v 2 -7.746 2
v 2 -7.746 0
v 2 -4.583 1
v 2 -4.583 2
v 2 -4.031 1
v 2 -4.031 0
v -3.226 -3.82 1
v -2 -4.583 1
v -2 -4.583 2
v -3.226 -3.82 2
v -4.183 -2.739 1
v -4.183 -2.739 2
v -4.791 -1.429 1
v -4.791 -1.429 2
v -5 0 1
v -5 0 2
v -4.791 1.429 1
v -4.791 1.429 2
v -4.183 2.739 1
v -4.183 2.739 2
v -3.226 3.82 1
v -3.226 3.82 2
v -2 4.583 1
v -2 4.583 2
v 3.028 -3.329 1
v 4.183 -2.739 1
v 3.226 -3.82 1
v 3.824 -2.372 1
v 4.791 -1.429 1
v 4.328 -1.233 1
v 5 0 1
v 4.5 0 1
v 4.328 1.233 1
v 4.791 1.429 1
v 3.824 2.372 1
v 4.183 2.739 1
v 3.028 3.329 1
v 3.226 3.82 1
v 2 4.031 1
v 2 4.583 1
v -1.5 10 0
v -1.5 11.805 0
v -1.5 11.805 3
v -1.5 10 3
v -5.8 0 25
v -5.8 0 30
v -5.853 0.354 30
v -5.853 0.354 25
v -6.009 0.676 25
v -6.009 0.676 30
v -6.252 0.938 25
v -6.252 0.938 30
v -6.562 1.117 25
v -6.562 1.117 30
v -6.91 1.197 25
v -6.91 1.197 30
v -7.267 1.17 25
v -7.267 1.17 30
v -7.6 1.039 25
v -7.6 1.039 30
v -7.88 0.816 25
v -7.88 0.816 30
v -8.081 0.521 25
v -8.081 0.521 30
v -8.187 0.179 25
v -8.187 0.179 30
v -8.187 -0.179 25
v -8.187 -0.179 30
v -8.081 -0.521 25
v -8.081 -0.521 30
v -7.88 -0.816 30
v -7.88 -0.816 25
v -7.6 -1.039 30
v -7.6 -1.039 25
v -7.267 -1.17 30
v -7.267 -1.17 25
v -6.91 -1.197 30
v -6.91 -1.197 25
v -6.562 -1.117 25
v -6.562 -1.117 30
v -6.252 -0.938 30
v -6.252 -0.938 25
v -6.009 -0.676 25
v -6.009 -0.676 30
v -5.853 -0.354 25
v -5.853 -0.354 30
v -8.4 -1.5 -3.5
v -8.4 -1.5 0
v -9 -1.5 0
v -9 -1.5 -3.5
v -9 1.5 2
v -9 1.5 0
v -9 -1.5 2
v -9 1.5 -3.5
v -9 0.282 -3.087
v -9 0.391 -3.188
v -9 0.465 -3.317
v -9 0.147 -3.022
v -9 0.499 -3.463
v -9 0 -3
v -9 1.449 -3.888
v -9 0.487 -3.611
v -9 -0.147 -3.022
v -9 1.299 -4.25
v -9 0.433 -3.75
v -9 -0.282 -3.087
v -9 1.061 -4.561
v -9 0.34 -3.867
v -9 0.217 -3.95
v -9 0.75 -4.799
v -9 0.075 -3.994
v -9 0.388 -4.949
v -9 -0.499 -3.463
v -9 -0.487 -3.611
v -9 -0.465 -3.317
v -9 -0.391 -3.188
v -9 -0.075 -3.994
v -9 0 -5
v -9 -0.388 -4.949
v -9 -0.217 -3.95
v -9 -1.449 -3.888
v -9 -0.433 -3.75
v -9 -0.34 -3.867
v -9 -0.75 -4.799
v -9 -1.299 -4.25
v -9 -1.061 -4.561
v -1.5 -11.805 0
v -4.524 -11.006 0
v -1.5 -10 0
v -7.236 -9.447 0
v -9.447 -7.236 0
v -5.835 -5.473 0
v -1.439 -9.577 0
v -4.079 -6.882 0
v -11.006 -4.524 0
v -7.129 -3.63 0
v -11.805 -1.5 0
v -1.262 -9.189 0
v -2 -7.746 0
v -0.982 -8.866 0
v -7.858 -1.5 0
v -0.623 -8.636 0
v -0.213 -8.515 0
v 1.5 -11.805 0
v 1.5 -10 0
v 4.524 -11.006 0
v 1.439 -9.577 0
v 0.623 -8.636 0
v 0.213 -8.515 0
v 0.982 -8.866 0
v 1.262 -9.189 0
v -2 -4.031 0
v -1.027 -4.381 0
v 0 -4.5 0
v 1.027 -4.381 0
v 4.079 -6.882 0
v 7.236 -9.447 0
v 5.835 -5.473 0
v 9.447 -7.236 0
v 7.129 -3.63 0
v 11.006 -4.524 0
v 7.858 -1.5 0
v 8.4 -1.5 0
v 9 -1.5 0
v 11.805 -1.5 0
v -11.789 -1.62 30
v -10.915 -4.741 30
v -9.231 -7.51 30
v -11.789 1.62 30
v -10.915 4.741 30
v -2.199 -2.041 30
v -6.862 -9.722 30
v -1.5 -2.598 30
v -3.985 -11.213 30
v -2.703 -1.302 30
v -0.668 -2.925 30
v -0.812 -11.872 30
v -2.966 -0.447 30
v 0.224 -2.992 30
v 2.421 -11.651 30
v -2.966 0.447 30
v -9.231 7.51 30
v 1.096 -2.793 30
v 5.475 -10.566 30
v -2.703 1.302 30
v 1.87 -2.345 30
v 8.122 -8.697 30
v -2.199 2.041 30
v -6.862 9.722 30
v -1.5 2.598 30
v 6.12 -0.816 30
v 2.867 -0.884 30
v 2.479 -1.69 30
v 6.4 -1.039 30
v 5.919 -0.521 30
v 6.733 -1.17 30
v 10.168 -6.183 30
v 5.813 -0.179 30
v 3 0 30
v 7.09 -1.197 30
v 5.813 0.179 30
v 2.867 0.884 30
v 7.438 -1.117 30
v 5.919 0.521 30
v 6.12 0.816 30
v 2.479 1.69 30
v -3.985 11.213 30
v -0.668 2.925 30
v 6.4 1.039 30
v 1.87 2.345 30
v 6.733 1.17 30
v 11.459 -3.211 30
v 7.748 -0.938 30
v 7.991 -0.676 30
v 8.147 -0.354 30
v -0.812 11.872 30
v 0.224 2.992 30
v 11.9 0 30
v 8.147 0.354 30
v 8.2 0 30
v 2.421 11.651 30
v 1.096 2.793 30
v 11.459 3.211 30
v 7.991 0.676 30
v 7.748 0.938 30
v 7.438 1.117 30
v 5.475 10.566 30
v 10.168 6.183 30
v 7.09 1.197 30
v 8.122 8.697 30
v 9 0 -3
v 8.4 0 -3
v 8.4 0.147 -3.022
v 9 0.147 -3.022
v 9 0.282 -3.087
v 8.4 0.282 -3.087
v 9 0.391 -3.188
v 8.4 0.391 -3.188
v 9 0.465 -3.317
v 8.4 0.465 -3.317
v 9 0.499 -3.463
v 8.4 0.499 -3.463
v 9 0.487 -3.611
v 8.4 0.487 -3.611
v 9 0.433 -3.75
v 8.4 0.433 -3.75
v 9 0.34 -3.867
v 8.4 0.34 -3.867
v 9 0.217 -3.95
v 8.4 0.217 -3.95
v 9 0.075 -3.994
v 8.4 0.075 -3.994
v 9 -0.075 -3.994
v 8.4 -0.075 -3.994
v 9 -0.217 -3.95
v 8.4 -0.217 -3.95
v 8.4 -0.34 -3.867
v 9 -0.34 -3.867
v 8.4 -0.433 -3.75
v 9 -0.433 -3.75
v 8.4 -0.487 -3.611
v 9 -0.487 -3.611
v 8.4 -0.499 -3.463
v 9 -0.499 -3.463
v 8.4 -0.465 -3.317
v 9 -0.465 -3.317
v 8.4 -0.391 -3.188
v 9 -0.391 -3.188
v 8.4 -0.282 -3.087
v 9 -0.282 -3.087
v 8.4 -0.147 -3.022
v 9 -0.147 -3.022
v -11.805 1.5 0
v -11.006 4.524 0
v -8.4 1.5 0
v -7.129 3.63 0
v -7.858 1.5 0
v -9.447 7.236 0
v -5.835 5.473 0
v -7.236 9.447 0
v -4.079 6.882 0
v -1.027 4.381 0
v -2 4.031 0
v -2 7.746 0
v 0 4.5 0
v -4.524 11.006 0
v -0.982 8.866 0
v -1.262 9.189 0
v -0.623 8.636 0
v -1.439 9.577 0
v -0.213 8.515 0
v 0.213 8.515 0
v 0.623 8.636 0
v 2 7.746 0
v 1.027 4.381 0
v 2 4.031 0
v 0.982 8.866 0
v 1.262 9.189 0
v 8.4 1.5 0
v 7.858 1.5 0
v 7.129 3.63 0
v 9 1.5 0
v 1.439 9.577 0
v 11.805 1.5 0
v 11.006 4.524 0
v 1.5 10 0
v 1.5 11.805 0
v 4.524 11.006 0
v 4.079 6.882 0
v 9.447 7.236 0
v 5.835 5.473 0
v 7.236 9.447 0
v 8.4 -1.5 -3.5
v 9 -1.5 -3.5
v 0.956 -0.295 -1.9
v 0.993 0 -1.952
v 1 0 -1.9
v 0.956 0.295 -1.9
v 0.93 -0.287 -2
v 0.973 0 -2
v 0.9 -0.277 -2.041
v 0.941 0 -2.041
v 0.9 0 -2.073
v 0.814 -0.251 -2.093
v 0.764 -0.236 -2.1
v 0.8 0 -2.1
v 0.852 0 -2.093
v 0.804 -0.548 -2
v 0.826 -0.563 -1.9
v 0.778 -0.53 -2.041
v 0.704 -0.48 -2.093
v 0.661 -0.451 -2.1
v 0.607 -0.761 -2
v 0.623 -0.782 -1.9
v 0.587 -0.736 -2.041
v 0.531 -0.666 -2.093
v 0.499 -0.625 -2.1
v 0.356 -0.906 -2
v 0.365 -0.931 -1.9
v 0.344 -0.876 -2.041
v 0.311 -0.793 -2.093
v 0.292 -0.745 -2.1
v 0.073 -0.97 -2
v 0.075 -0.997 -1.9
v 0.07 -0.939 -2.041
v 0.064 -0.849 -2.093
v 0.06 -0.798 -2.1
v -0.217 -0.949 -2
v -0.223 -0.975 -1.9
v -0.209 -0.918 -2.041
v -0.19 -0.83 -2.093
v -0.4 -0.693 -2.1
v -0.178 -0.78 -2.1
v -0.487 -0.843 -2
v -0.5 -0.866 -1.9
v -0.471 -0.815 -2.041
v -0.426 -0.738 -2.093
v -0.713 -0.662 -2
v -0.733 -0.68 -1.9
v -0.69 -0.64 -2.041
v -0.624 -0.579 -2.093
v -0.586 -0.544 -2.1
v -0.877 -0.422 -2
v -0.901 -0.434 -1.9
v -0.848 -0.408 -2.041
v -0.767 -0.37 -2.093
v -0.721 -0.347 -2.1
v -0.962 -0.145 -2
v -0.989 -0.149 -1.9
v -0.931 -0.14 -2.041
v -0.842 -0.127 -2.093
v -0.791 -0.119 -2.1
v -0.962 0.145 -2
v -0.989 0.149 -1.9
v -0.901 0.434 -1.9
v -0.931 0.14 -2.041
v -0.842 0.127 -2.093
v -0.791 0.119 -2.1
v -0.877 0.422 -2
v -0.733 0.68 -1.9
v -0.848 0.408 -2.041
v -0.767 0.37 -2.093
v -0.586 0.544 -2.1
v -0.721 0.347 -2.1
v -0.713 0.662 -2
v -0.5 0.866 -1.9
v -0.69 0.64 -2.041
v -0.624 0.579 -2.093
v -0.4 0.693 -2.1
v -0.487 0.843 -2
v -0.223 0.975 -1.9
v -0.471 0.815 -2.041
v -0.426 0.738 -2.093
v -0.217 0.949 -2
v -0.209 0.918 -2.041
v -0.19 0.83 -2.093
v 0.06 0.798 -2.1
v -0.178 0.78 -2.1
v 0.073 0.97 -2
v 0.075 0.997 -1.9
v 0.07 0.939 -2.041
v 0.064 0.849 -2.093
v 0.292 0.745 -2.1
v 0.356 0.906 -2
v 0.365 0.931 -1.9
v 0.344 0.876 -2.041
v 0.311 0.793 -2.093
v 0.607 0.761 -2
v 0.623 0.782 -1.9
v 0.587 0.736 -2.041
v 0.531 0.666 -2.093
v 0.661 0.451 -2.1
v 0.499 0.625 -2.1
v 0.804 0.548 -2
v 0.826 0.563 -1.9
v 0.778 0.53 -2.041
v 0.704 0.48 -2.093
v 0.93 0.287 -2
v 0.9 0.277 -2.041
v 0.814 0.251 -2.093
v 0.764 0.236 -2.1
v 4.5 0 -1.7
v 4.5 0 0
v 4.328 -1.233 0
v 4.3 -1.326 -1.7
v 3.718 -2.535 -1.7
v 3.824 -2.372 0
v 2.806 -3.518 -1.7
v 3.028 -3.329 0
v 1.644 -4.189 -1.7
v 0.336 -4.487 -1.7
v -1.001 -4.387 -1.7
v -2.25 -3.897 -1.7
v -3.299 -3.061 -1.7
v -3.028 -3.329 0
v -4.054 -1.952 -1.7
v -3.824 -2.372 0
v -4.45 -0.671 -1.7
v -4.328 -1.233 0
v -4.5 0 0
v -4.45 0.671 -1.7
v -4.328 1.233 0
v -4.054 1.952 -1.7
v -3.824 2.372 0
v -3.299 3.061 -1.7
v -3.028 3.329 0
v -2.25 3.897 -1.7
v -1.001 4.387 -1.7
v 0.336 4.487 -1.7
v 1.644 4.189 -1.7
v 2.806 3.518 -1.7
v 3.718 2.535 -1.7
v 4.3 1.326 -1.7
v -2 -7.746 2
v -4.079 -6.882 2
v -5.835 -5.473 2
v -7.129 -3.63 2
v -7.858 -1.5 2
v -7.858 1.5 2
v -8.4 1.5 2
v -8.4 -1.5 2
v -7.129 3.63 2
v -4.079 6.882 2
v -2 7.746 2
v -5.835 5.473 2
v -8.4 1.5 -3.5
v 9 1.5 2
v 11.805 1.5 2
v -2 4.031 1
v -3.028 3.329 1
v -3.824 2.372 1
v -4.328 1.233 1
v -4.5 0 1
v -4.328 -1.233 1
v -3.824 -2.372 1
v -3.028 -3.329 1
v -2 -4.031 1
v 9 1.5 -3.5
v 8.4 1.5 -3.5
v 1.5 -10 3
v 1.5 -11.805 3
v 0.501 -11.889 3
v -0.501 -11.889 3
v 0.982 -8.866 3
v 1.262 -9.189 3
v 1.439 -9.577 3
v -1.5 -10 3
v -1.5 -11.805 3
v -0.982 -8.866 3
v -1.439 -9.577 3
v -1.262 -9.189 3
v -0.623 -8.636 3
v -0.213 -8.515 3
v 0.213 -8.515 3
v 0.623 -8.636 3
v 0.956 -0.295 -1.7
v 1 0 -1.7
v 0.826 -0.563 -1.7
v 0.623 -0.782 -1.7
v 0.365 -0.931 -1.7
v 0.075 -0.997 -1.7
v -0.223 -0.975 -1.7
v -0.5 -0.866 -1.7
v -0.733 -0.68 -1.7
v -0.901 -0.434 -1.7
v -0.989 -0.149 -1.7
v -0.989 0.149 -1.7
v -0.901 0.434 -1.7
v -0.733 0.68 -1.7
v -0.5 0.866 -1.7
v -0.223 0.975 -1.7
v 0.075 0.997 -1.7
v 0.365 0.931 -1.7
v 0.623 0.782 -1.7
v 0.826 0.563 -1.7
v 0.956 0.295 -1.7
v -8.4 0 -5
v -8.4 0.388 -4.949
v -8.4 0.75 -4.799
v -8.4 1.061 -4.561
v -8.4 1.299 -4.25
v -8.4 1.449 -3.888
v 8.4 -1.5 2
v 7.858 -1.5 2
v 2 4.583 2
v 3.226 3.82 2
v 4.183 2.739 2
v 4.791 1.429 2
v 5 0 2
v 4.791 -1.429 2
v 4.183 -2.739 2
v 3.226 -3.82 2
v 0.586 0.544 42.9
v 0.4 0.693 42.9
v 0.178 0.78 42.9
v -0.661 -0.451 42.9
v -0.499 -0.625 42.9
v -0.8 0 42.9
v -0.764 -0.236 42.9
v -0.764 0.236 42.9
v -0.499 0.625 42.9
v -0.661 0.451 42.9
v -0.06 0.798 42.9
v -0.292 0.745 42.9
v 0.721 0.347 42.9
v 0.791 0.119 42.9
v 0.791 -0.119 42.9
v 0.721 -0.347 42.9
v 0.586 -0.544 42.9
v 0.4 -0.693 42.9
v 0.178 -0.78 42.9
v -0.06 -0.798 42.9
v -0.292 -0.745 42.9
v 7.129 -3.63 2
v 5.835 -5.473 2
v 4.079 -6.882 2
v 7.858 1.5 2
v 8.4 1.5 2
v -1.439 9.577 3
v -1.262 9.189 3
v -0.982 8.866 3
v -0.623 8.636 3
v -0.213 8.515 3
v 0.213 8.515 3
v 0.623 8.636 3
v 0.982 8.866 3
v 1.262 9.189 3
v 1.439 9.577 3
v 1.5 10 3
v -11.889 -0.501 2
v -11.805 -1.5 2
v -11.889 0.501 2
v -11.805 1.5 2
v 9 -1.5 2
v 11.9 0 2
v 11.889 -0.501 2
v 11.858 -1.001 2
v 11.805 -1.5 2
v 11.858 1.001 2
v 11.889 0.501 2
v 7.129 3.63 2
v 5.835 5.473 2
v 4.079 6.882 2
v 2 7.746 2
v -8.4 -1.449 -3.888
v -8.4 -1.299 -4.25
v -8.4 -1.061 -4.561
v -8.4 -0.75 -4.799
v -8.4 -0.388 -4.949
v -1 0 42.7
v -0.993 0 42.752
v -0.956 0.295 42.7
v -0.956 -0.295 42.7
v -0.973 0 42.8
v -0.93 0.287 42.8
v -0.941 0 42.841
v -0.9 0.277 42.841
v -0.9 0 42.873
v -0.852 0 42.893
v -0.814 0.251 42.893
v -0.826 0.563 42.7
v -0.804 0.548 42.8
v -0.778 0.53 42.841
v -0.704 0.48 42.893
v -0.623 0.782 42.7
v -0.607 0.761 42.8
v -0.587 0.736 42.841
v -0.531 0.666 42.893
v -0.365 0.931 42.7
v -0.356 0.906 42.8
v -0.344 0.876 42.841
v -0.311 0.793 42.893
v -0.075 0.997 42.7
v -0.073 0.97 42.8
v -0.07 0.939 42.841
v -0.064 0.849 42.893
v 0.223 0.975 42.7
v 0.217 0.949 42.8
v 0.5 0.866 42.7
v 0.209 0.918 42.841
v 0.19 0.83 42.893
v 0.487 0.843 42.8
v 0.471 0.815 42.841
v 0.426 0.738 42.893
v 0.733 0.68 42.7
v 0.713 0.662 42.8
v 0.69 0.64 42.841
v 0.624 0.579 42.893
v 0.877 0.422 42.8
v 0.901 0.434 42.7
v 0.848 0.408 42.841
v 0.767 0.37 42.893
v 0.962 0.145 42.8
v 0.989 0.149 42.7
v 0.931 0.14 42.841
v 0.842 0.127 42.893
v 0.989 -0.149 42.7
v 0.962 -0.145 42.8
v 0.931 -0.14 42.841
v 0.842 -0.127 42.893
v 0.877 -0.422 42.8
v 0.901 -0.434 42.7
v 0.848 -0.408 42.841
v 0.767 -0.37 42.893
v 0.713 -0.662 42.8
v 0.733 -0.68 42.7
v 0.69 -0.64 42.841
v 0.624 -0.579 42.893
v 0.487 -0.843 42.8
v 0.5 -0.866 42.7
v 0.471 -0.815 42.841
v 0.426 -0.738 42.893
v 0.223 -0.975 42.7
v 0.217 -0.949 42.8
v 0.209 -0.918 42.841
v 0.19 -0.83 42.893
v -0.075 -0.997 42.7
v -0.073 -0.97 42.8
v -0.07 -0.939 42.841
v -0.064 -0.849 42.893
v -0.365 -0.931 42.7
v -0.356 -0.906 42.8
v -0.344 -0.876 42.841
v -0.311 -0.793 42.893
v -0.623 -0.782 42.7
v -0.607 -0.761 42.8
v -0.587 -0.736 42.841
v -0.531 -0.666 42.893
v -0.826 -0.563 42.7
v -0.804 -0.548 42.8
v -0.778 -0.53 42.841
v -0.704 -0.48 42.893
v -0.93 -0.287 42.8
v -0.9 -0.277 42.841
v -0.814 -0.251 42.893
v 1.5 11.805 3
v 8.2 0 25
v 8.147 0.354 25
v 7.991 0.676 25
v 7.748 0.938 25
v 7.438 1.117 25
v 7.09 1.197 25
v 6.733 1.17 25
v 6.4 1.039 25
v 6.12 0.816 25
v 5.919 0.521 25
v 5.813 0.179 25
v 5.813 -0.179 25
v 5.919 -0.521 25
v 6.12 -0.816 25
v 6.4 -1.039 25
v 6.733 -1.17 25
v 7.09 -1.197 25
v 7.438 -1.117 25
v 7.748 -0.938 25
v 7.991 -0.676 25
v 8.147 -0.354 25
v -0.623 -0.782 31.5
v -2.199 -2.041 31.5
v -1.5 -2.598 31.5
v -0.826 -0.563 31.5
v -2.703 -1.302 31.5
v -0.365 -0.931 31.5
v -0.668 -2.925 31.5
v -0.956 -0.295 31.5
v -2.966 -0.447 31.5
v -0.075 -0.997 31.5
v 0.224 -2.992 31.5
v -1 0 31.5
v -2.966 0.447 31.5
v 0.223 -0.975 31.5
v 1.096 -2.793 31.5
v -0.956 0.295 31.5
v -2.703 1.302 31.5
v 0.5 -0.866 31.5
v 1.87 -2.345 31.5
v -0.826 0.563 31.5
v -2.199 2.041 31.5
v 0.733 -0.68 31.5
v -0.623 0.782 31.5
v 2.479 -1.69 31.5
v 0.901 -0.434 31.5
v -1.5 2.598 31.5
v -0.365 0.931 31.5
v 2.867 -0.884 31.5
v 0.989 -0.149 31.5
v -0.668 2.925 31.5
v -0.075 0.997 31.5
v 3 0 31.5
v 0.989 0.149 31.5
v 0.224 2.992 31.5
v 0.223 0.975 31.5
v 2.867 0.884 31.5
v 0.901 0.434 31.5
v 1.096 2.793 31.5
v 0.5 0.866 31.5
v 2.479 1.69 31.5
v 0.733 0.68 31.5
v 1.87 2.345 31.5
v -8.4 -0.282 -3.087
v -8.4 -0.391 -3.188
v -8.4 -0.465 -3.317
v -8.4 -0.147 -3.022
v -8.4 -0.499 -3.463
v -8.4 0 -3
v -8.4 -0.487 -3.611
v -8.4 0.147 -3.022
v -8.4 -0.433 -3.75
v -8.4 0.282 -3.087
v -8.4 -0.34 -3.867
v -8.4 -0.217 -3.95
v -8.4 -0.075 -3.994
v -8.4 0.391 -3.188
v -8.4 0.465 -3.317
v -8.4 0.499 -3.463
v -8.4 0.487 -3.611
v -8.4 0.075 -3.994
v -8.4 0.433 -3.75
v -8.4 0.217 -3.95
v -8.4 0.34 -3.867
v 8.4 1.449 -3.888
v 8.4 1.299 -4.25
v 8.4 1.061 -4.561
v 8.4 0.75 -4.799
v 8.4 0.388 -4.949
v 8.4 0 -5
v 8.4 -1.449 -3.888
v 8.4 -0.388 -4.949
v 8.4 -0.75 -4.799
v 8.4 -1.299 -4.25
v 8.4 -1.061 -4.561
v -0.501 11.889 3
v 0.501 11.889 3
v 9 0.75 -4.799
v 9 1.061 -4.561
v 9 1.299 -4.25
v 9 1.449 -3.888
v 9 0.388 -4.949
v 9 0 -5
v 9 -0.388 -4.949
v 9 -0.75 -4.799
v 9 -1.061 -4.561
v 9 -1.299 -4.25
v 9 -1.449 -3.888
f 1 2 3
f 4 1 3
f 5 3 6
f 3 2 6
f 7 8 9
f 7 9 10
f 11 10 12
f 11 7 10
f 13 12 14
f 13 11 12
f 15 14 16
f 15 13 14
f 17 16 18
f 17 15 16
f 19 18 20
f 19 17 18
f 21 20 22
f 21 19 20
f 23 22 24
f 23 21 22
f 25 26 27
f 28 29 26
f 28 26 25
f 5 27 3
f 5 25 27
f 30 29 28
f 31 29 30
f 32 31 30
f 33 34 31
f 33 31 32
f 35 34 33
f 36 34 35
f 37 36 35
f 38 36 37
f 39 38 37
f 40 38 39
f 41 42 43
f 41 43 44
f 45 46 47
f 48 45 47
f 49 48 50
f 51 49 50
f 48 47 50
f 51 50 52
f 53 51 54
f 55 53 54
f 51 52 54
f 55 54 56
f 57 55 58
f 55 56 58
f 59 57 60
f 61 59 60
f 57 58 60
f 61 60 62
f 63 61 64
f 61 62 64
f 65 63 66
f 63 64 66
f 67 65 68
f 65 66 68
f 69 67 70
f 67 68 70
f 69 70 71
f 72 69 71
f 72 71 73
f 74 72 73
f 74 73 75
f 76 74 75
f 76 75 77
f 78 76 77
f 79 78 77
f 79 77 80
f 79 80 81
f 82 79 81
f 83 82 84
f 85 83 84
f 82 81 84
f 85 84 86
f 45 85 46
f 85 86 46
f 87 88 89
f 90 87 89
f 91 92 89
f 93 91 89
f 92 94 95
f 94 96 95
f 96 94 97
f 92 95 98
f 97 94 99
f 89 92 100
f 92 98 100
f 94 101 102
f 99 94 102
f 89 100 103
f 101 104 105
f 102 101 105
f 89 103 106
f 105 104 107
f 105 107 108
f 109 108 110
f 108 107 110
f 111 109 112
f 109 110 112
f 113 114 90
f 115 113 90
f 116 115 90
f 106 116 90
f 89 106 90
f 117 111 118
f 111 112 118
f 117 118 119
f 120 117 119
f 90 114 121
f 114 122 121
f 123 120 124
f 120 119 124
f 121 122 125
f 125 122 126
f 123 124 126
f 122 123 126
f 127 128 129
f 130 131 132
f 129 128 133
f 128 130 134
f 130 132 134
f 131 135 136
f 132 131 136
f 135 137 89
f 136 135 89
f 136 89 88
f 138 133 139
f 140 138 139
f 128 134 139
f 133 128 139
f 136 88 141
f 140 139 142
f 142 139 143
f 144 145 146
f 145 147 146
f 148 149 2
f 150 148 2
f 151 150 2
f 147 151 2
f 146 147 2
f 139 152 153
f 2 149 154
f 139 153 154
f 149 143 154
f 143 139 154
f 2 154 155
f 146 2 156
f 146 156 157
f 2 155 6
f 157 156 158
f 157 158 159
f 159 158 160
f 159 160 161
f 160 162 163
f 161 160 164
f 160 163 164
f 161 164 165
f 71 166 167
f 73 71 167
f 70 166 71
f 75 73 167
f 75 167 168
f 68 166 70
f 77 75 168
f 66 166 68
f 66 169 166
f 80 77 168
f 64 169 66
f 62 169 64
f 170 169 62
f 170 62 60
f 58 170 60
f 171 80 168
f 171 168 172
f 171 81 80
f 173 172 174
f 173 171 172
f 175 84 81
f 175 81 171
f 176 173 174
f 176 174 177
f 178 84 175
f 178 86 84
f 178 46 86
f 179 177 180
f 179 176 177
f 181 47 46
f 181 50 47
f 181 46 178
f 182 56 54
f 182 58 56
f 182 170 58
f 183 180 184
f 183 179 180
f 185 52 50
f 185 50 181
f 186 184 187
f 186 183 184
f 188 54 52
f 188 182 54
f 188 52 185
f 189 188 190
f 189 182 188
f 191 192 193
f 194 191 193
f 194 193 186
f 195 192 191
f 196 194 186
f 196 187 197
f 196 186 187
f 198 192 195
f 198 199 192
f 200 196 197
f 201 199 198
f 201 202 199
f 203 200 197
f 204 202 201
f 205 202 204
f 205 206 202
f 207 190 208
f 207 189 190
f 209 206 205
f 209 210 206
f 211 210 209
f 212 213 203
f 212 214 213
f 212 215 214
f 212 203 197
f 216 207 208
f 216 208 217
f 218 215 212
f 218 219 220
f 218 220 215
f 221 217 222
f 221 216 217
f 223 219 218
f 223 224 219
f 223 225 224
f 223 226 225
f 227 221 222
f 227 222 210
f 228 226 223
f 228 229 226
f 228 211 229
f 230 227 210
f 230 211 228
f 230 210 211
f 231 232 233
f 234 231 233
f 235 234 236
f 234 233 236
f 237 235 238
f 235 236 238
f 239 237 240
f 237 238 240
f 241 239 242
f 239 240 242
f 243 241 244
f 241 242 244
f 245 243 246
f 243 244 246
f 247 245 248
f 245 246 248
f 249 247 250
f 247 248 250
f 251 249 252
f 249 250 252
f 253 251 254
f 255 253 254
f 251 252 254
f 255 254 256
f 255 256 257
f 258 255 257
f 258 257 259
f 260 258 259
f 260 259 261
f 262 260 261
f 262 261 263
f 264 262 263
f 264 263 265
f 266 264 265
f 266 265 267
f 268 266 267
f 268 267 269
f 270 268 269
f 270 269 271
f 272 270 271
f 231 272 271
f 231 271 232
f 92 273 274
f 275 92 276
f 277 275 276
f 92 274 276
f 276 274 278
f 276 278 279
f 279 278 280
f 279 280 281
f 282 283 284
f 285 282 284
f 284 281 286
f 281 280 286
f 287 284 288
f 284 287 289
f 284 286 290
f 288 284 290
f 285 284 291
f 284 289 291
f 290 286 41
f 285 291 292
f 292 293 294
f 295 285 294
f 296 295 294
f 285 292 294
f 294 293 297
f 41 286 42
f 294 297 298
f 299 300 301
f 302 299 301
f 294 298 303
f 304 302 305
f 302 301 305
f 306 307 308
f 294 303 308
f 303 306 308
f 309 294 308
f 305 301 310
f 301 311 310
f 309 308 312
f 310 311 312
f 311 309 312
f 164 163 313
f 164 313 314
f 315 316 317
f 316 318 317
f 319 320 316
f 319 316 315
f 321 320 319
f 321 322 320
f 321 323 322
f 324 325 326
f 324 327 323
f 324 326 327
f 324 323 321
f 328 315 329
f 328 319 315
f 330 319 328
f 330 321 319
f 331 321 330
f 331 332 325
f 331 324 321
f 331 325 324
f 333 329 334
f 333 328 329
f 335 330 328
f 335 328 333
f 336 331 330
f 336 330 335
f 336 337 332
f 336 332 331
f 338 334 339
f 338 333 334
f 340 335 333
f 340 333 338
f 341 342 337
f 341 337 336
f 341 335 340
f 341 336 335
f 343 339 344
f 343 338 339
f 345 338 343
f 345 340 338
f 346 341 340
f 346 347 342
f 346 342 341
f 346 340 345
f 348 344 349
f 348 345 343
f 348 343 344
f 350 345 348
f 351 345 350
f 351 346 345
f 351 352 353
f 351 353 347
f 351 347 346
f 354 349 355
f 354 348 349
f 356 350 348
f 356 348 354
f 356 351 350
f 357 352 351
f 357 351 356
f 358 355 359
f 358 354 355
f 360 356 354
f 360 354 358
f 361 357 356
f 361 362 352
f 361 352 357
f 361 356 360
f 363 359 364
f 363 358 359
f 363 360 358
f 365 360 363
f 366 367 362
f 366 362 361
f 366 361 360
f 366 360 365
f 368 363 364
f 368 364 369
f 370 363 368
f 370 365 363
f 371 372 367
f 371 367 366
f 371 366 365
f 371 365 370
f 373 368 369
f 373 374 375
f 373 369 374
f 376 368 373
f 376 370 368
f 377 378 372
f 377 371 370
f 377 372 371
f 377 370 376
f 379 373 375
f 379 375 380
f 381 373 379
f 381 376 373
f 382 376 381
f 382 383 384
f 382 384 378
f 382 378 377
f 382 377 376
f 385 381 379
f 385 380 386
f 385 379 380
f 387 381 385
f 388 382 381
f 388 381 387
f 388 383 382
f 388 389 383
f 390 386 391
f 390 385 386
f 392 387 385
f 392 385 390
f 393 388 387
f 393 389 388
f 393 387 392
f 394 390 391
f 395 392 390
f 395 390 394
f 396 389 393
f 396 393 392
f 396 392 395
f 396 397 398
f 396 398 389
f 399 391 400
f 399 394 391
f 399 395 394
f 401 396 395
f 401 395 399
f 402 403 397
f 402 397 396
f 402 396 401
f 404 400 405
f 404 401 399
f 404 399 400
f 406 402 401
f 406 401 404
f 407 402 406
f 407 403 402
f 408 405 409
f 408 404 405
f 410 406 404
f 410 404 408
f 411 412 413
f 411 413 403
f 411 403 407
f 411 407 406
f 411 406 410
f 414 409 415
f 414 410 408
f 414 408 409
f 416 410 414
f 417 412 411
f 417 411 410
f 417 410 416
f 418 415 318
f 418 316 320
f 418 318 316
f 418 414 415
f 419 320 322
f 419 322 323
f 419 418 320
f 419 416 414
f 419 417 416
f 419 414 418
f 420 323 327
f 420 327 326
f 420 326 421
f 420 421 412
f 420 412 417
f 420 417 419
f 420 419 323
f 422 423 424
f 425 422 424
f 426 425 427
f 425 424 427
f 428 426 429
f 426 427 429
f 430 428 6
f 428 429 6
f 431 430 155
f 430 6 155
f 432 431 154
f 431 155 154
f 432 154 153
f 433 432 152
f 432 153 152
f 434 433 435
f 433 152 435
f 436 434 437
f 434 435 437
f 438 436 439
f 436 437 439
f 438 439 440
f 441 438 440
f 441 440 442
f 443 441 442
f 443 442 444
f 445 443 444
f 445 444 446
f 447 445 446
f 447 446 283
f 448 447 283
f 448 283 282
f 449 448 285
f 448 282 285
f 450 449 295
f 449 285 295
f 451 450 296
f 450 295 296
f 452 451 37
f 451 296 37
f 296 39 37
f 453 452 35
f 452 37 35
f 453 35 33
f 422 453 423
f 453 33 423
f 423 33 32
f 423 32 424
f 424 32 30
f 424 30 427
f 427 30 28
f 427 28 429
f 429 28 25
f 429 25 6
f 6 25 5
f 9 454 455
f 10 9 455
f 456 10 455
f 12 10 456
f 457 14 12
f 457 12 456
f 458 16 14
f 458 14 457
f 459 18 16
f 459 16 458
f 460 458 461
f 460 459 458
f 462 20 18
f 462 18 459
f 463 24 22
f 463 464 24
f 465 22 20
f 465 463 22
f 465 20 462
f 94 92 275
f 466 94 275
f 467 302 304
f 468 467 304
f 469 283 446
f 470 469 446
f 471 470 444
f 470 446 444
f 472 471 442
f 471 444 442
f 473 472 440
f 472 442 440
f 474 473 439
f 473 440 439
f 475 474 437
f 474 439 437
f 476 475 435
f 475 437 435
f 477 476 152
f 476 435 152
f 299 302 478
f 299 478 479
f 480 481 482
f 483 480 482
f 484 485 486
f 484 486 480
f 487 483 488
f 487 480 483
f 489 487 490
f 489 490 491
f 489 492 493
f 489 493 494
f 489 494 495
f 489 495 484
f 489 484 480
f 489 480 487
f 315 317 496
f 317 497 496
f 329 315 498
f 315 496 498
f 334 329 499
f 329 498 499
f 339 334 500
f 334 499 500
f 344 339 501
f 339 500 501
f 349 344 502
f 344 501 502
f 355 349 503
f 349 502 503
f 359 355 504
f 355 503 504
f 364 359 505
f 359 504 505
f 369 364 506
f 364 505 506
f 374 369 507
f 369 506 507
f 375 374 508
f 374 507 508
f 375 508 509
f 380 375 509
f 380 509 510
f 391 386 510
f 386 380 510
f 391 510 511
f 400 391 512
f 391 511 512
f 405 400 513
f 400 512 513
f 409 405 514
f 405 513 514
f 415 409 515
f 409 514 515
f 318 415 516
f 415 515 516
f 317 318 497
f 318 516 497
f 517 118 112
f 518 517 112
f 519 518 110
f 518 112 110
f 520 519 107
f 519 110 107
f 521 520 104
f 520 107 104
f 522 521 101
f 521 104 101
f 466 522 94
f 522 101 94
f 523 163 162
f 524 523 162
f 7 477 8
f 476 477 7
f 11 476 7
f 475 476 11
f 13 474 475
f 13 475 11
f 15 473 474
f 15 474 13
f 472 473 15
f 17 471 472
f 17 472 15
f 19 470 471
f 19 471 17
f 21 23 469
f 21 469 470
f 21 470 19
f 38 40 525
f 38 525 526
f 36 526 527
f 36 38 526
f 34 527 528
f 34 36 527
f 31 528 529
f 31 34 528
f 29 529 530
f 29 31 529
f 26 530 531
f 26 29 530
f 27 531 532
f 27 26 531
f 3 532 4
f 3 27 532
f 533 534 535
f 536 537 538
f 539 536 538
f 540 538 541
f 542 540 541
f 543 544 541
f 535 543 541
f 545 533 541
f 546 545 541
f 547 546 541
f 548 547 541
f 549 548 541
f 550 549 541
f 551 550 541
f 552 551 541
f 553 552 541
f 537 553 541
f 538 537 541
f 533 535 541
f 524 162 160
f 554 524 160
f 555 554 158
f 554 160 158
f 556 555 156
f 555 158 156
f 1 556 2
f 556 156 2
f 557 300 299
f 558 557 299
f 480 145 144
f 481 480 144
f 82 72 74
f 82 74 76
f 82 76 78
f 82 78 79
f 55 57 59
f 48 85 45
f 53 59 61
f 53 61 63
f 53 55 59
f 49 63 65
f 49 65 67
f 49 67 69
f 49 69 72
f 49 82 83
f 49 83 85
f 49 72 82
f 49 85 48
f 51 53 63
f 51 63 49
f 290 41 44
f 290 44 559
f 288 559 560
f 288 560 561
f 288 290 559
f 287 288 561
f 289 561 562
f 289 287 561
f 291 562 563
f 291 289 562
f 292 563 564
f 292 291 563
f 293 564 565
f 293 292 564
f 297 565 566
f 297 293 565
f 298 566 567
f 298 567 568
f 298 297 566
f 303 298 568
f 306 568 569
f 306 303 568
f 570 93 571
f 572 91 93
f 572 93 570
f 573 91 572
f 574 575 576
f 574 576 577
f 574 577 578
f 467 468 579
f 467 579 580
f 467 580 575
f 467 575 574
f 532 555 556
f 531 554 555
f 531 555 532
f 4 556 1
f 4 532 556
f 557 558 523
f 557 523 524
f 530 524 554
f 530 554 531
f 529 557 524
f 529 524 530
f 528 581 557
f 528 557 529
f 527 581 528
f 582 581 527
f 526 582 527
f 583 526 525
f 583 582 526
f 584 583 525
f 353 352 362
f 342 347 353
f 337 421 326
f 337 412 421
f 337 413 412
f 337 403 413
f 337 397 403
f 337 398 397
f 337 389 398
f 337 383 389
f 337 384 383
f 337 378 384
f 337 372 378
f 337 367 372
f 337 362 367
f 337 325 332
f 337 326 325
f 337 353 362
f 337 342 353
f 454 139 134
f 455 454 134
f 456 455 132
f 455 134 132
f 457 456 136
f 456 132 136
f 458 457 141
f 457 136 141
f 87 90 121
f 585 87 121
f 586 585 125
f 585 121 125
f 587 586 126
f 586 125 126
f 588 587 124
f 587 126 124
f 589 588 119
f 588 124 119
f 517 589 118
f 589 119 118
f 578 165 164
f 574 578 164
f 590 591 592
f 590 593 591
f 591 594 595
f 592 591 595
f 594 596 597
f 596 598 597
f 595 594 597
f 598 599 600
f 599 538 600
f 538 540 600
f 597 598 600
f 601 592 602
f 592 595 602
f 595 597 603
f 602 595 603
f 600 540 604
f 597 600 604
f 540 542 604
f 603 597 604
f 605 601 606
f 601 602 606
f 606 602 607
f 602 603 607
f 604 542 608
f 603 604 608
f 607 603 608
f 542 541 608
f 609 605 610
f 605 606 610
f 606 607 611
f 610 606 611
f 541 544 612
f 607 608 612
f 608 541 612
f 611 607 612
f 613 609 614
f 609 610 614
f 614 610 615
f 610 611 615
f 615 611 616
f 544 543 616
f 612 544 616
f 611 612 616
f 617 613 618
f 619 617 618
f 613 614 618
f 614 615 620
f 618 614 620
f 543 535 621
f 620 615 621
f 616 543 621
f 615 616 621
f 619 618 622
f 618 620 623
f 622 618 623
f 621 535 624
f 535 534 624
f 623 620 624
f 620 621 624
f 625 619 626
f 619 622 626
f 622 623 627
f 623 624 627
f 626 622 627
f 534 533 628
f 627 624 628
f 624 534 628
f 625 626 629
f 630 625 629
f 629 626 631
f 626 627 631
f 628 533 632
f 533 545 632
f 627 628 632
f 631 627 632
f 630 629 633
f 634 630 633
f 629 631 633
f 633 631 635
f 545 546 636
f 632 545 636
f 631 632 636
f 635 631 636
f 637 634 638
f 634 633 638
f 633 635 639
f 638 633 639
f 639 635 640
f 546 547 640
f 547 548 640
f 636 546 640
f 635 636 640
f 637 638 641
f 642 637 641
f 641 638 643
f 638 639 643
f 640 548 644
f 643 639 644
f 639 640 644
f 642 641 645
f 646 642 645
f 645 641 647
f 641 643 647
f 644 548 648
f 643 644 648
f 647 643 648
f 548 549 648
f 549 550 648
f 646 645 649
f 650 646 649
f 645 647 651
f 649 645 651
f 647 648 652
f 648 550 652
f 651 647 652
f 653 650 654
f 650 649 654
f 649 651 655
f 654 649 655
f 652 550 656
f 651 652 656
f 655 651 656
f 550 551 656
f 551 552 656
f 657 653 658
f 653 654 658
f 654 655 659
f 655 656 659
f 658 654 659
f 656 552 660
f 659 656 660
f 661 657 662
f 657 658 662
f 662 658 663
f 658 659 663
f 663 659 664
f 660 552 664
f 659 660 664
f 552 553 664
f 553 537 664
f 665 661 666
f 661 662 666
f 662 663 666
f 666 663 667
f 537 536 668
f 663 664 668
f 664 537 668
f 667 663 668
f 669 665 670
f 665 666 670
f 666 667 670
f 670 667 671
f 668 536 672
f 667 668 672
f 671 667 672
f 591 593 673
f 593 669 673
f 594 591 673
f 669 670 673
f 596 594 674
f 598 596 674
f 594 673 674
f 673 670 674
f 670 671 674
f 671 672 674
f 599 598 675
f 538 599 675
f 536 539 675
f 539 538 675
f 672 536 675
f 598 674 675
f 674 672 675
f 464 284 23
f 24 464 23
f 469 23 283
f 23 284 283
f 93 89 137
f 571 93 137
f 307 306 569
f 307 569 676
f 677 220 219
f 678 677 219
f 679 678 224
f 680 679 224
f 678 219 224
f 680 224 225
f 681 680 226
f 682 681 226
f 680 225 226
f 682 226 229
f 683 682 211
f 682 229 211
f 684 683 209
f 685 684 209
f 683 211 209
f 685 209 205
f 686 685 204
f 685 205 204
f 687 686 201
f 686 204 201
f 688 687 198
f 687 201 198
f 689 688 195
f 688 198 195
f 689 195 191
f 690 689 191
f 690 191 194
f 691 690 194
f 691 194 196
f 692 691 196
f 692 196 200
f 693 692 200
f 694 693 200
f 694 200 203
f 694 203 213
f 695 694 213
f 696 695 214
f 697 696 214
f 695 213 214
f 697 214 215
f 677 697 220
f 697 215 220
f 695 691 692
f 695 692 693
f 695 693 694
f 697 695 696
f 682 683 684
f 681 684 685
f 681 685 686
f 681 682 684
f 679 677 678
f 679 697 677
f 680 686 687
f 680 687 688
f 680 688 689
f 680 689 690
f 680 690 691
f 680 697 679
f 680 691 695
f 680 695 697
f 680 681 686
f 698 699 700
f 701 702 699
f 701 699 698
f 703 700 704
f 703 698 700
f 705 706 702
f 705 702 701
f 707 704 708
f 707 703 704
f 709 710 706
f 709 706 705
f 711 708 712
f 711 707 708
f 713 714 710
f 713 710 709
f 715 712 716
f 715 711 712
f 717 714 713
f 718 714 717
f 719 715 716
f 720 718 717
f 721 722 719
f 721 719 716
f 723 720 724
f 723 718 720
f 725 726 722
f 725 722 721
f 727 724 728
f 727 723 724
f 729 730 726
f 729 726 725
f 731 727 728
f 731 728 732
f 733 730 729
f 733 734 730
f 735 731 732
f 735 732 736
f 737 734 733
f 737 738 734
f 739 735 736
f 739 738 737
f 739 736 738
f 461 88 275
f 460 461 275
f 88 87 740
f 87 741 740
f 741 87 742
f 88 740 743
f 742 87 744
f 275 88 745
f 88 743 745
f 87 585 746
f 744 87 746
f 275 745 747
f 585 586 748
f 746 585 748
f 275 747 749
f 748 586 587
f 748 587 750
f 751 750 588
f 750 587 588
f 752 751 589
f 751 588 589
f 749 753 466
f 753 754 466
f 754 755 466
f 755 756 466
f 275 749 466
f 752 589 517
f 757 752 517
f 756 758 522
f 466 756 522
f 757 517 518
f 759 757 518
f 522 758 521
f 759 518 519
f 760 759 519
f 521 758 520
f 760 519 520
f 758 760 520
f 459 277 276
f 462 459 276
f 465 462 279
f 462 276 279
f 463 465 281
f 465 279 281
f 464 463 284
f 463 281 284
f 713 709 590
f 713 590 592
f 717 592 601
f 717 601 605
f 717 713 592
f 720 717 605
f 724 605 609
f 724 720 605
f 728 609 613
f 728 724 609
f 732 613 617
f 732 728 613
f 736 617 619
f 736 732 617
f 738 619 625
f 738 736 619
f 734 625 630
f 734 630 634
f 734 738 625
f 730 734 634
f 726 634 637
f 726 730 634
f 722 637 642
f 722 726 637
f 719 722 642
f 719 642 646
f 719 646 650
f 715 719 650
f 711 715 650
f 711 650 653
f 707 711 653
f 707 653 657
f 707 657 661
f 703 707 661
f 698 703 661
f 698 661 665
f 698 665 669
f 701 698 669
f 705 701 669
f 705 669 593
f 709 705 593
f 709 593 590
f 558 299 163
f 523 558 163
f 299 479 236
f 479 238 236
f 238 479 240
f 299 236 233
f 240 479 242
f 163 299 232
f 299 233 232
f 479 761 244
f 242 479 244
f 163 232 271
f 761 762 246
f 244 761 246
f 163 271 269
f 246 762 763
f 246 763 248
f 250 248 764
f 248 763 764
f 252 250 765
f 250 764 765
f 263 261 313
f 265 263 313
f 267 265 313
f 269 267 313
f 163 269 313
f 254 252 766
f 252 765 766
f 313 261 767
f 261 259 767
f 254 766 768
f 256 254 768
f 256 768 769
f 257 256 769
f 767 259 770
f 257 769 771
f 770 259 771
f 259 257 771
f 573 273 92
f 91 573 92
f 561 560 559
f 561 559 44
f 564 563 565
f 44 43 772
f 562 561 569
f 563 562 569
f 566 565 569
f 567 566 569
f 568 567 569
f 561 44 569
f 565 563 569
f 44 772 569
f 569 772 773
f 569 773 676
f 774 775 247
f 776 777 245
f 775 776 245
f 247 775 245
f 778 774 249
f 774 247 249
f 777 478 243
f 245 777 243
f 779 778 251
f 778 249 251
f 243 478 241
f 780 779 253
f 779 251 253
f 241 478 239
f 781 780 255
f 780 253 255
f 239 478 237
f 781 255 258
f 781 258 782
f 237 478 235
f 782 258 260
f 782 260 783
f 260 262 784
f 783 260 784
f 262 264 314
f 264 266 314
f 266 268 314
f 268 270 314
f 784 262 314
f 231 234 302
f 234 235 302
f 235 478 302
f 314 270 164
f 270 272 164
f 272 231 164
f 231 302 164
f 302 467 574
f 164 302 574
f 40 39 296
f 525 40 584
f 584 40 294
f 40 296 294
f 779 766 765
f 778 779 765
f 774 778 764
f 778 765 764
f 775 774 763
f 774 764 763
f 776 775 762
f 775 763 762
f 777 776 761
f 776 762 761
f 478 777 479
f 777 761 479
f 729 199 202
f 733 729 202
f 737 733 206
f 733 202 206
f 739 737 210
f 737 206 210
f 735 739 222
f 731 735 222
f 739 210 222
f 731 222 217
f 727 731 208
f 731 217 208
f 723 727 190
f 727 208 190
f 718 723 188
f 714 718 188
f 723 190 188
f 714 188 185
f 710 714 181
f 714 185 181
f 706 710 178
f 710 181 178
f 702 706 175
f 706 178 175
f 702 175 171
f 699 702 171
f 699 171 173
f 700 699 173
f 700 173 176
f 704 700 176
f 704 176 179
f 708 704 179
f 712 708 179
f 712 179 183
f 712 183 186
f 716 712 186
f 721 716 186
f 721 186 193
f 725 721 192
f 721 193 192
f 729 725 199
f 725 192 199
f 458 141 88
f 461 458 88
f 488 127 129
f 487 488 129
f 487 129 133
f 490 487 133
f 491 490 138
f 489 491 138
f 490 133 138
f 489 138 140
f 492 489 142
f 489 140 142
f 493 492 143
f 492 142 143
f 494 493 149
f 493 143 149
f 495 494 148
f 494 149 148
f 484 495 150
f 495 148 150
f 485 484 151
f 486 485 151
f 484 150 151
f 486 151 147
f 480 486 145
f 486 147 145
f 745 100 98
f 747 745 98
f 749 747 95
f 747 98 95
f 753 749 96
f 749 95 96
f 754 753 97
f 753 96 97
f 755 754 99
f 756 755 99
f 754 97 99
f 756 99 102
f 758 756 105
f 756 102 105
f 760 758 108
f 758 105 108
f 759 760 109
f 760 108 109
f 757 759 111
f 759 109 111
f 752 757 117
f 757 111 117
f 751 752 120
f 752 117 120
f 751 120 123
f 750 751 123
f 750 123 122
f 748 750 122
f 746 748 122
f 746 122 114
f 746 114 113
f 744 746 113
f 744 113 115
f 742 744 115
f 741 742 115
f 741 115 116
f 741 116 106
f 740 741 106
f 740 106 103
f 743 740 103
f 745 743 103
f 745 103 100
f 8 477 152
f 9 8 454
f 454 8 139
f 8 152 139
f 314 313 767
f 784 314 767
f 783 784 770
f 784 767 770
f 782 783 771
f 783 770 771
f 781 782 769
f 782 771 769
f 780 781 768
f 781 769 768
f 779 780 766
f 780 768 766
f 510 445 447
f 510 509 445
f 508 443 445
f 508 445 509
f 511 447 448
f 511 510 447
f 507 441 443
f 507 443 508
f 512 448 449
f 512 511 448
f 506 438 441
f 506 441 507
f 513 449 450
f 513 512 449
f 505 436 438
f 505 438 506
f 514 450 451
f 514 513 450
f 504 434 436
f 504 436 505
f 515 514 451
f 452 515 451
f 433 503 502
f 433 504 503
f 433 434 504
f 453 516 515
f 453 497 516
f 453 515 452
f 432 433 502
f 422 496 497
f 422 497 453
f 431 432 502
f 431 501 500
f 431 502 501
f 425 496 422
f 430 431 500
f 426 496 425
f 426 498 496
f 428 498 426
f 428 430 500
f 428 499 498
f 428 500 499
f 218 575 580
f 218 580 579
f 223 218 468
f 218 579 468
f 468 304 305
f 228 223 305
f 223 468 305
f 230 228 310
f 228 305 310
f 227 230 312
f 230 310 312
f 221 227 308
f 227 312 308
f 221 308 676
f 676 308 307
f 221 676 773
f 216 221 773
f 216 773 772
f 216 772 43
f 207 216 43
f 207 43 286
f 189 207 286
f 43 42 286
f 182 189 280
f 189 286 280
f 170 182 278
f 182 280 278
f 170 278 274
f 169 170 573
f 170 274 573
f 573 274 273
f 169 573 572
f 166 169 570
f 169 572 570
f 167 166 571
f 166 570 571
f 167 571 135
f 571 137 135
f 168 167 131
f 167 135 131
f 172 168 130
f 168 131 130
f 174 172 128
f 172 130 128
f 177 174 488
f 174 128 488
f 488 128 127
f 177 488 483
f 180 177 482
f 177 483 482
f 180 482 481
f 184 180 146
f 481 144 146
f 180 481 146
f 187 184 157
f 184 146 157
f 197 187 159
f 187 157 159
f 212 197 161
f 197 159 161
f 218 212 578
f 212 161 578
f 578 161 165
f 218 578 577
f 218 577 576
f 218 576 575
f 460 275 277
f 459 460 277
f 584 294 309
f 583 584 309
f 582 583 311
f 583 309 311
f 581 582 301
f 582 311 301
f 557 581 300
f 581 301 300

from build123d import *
from build123d.topology import SkipClean

# Parameters (mm, degrees)
CROQUIS2_R              = 11.9
SALIENTE_EXTRUIR1_DEPTH = 30
CROQUIS3_R              = 3
SALIENTE_EXTRUIR2_DEPTH = 1.5
CROQUIS4_R              = 1
CORTAR_EXTRUIR1_DEPTH   = 36.713722853
CROQUIS5_R              = 1.2
CORTAR_EXTRUIR2_DEPTH   = 5
CROQUIS7_R              = 4.5
SALIENTE_EXTRUIR3_DEPTH = 1.7
CORTAR_EXTRUIR3_REACH   = 39.222
CROQUIS8_R              = 1
SALIENTE_EXTRUIR4_DEPTH = 5
CORTAR_EXTRUIR4_REACH   = 41.632
CROQUIS10_R             = 0.5
CORTAR_EXTRUIR5_DEPTH   = 3
CORTAR_EXTRUIR7_DEPTH   = 2
SALIENTE_EXTRUIR5_START = 1
SALIENTE_EXTRUIR5_DEPTH = 1
CROQUIS16_R             = 1
SALIENTE_EXTRUIR8_DEPTH = 0.4
CROQUIS17_R             = 1
SALIENTE_EXTRUIR9_DEPTH = 45
REDONDEO4_R             = 0.2


with BuildPart() as part:
    # Croquis2 → Saliente-Extruir1 (new body)
    with BuildSketch(Plane.XY):
        Circle(CROQUIS2_R)
    extrude(amount=SALIENTE_EXTRUIR1_DEPTH)

    # Croquis3 → Saliente-Extruir2 (add)
    with BuildSketch(Plane.XY.offset(30)):
        Circle(CROQUIS3_R)
    extrude(amount=SALIENTE_EXTRUIR2_DEPTH)

    # Croquis4 → Cortar-Extruir1 (cut, through all)
    with BuildSketch(Plane.XY.offset(31.5)):
        Circle(CROQUIS4_R)
    extrude(amount=-CORTAR_EXTRUIR1_DEPTH, mode=Mode.SUBTRACT)

    # Croquis5 → Cortar-Extruir2 (cut)
    with BuildSketch(Plane.XY.offset(30)):
        with Locations((7, 0)):
            Circle(CROQUIS5_R)
        with Locations((-7, 0)):
            Circle(CROQUIS5_R)
    extrude(amount=-CORTAR_EXTRUIR2_DEPTH, mode=Mode.SUBTRACT)

    # Croquis7 → Saliente-Extruir3 (add)
    with BuildSketch(Plane(origin=(0, 0, 0), x_dir=(-1, 0, 0), z_dir=(0, 0, -1))):
        with Locations(Location((0, 0, 0), (0, 0, 180))):
            Circle(CROQUIS7_R)
    extrude(amount=SALIENTE_EXTRUIR3_DEPTH)

    # Croquis8 → Cortar-Extruir3 (cut, up to next)
    with BuildSketch(Plane(origin=(0, 0, -1.7), x_dir=(-1, 0, 0), z_dir=(0, 0, -1)), mode=Mode.PRIVATE) as cortar_extruir3_sk1:
        with Locations(Location((0, 0, 0), (0, 0, 180))):
            Circle(CROQUIS8_R)
    cortar_extruir3_tool1 = extrude(cortar_extruir3_sk1.sketch, amount=-CORTAR_EXTRUIR3_REACH, mode=Mode.PRIVATE) & part.part
    add(cortar_extruir3_tool1.solids().sort_by_distance((0, 0, -1.7))[0], mode=Mode.SUBTRACT)

    # Croquis9 → Saliente-Extruir4 (add)
    with BuildSketch(Plane(origin=(0, 0, 0), x_dir=(-1, 0, 0), z_dir=(0, 0, -1))):
        Polygon((-9, 0), (-9, 1.5), (-8.4, 1.5), (-8.4, -1.5), (-9, -1.5), align=None)
        Polygon((9, 0), (9, 1.5), (8.4, 1.5), (8.4, -1.5), (9, -1.5), align=None)
    extrude(amount=SALIENTE_EXTRUIR4_DEPTH)

    # Cortar-Extruir4: up to this face of the body (flat: up to its plane)
    cortar_extruir4_end = Plane(part.part.faces().sort_by_distance((9, 0, -2.5))[0])
    # Croquis10 → Cortar-Extruir4 (cut, up to the picked face)
    with BuildSketch(Plane.ZY.offset(9), mode=Mode.PRIVATE) as cortar_extruir4_sk1:
        with BuildLine():
            Line((-5, -1.5), (-3.5, -1.5))
            ThreePointArc((-3.5, -1.5), (-4.560660172, -1.060660172), (-5, 0))
            Line((-5, 0), (-5, -1.5))
        make_face()
    cortar_extruir4_tool1 = split(extrude(cortar_extruir4_sk1.sketch, amount=-CORTAR_EXTRUIR4_REACH, mode=Mode.PRIVATE), bisect_by=cortar_extruir4_end, keep=Keep.BOTH, mode=Mode.PRIVATE)
    # Croquis10 → Cortar-Extruir4 (cut, up to the picked face)
    with BuildSketch(Plane.ZY.offset(9), mode=Mode.PRIVATE) as cortar_extruir4_sk2:
        with BuildLine():
            Line((-5, 1.5), (-5, 0))
            ThreePointArc((-5, 0), (-4.560660172, 1.060660172), (-3.5, 1.5))
            Line((-3.5, 1.5), (-5, 1.5))
        make_face()
    cortar_extruir4_tool2 = split(extrude(cortar_extruir4_sk2.sketch, amount=-CORTAR_EXTRUIR4_REACH, mode=Mode.PRIVATE), bisect_by=cortar_extruir4_end, keep=Keep.BOTH, mode=Mode.PRIVATE)
    # Croquis10 → Cortar-Extruir4 (cut, up to the picked face)
    with BuildSketch(Plane.ZY.offset(9), mode=Mode.PRIVATE) as cortar_extruir4_sk3:
        with Locations((-3.5, 0)):
            Circle(CROQUIS10_R)
    cortar_extruir4_tool3 = split(extrude(cortar_extruir4_sk3.sketch, amount=-CORTAR_EXTRUIR4_REACH, mode=Mode.PRIVATE), bisect_by=cortar_extruir4_end, keep=Keep.BOTH, mode=Mode.PRIVATE)
    add(cortar_extruir4_tool1.solids().sort_by(Axis((-9, -1.164948, -4.664948), (1, 0, 0)))[0], mode=Mode.SUBTRACT)
    add(cortar_extruir4_tool2.solids().sort_by(Axis((-9, 1.164948, -4.664948), (1, 0, 0)))[0], mode=Mode.SUBTRACT)
    add(cortar_extruir4_tool3.solids().sort_by(Axis((-9, 0, -3.5), (1, 0, 0)))[0], mode=Mode.SUBTRACT)

    # Croquis11 → Cortar-Extruir5 (cut)
    with BuildSketch(Plane(origin=(0, 0, 0), x_dir=(-1, 0, 0), z_dir=(0, 0, -1))):
        with BuildLine():
            Line((-1.5, -10), (-1.5, -12.544656971))
            Line((-1.5, -12.544656971), (1.5, -12.544656971))
            Line((1.5, -12.544656971), (1.5, -10))
            ThreePointArc((1.5, -10), (0, -8.5), (-1.5, -10))
        make_face()
        with BuildLine():
            Line((-1.5, 10), (-1.5, 12.84563131))
            Line((-1.5, 12.84563131), (1.5, 12.84563131))
            Line((1.5, 12.84563131), (1.5, 10))
            ThreePointArc((1.5, 10), (0, 8.5), (-1.5, 10))
        make_face()
    extrude(amount=-CORTAR_EXTRUIR5_DEPTH, mode=Mode.SUBTRACT)

    # Croquis12 → Cortar-Extruir7 (cut)
    with SkipClean():  # the faces are left unmerged after this step: merging them gives an invalid solid
        with BuildSketch(Plane(origin=(0, 0, 0), x_dir=(-1, 0, 0), z_dir=(0, 0, -1))):
            with BuildLine():
                Line((-2, 4.031128874), (-2, 7.745966692))
                ThreePointArc((-2, 7.745966692), (-5.835121404, 5.472783405), (-7.858116823, 1.5))
                Line((-7.858116823, 1.5), (-8.4, 1.5))
                Line((-8.4, 1.5), (-8.4, -1.5))
                Line((-8.4, -1.5), (-7.858116823, -1.5))
                ThreePointArc((-7.858116823, -1.5), (-5.835121404, -5.472783405), (-2, -7.745966692))
                Line((-2, -7.745966692), (-2, -4.031128874))
                ThreePointArc((-2, -4.031128874), (-4.5, 0), (-2, 4.031128874))
            make_face()
            with BuildLine():
                Line((2, -4.031128874), (2, -7.745966692))
                ThreePointArc((2, -7.745966692), (5.835121404, -5.472783405), (7.858116823, -1.5))
                Line((7.858116823, -1.5), (8.4, -1.5))
                Line((8.4, -1.5), (8.4, 1.5))
                Line((8.4, 1.5), (7.858116823, 1.5))
                ThreePointArc((7.858116823, 1.5), (5.835121404, 5.472783405), (2, 7.745966692))
                Line((2, 7.745966692), (2, 4.031128874))
                ThreePointArc((2, 4.031128874), (4.5, 0), (2, -4.031128874))
            make_face()
            with BuildLine():
                Line((-9, -1.5), (-9, 1.5))
                Line((-9, 1.5), (-11.805083651, 1.5))
                ThreePointArc((-11.805083651, 1.5), (-11.9, 0), (-11.805083651, -1.5))
                Line((-11.805083651, -1.5), (-9, -1.5))
            make_face()
            with BuildLine():
                Line((9, 1.5), (9, -1.5))
                Line((9, -1.5), (11.805083651, -1.5))
                ThreePointArc((11.805083651, -1.5), (11.9, 0), (11.805083651, 1.5))
                Line((11.805083651, 1.5), (9, 1.5))
            make_face()
        extrude(amount=-CORTAR_EXTRUIR7_DEPTH, mode=Mode.SUBTRACT)

    # Croquis13 → Saliente-Extruir5 (add)
    with SkipClean():  # the faces are left unmerged after this step: merging them gives an invalid solid
        with BuildSketch(Plane(origin=(0, 0, 2), x_dir=(-1, 0, 0), z_dir=(0, 0, -1)).offset(SALIENTE_EXTRUIR5_START)):
            with BuildLine():
                Line((2, 4.582575695), (2, 4.031128874))
                ThreePointArc((2, 4.031128874), (4.5, 0), (2, -4.031128874))
                Line((2, -4.031128874), (2, -4.582575695))
                ThreePointArc((2, -4.582575695), (5, 0), (2, 4.582575695))
            make_face()
            with BuildLine():
                Line((-2, -4.582575695), (-2, -4.031128874))
                ThreePointArc((-2, -4.031128874), (-4.5, 0), (-2, 4.031128874))
                Line((-2, 4.031128874), (-2, 4.582575695))
                ThreePointArc((-2, 4.582575695), (-5, 0), (-2, -4.582575695))
            make_face()
        extrude(amount=-SALIENTE_EXTRUIR5_DEPTH)



with BuildPart() as body_2:
    # Croquis16 → Saliente-Extruir8 (new body)
    with BuildSketch(Plane(origin=(0, 0, -1.7), x_dir=(-1, 0, 0), z_dir=(0, 0, -1))):
        with Locations(Location((0, 0, 0), (0, 0, 180))):
            Circle(CROQUIS16_R)
    extrude(amount=SALIENTE_EXTRUIR8_DEPTH)


with BuildPart() as part_1:
    with SkipClean():  # the faces are left unmerged after this step: merging them gives an invalid solid
        add(part.part)

        add(body_2.part)  # Saliente-Extruir9 merges body 2
        # Croquis17 → Saliente-Extruir9 (add)
        with BuildSketch(Plane(origin=(0, 0, -2.1), x_dir=(-1, 0, 0), z_dir=(0, 0, -1))):
            Circle(CROQUIS17_R)
        extrude(amount=-SALIENTE_EXTRUIR9_DEPTH)

    # Redondeo4
    redondeo4_edges = [part_1.edges().sort_by_distance(p)[0] for p in [
        (1, 0, 42.9),
        (0, -1, -2.1),
    ]]
    fillet(redondeo4_edges, radius=REDONDEO4_R)


solid = part_1.part
